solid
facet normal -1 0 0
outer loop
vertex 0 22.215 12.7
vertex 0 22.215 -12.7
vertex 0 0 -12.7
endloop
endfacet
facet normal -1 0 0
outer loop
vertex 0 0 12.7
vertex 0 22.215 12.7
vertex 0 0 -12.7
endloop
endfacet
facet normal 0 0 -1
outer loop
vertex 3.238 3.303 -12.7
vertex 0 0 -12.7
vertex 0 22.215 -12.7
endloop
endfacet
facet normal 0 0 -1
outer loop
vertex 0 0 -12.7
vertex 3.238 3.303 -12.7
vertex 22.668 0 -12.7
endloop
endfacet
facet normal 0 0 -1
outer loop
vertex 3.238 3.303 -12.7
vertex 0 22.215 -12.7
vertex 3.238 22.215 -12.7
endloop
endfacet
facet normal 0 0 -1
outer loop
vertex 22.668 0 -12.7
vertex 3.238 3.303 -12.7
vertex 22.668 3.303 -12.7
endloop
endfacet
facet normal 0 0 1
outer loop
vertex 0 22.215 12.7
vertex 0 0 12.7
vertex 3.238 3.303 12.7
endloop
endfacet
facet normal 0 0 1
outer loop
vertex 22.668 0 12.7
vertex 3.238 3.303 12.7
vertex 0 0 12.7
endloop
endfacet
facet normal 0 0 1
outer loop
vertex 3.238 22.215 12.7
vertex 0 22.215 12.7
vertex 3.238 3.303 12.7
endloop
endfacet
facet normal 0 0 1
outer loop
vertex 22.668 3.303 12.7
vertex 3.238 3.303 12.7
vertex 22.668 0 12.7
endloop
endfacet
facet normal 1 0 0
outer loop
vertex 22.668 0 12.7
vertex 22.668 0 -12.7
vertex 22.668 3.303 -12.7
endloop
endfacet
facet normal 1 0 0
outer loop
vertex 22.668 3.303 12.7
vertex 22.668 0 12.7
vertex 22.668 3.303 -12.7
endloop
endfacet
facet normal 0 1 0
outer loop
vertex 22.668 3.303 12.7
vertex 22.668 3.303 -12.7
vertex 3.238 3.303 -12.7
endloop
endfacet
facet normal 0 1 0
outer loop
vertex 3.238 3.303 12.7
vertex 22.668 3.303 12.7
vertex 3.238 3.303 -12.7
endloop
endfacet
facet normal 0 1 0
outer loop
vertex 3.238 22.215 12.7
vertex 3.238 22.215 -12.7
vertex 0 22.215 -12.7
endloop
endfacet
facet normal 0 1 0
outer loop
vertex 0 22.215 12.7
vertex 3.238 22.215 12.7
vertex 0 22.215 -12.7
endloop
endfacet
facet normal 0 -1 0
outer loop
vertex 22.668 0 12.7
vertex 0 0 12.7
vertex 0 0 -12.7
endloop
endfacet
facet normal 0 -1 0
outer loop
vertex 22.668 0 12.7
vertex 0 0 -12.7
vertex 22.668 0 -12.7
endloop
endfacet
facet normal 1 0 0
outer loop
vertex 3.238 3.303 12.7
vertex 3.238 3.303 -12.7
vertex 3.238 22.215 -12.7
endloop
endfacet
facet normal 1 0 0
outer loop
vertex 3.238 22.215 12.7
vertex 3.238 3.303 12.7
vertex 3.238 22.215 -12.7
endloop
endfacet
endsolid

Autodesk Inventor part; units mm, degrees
sketch "Sketch1" plane through (0, 0, 0) normal (0, 0, 1) x (1, 0, 0)
  line L0 (0, 22.215) -> (0, 0)
  line L1 (0, 0) -> (22.6684, 0)
  line L2 (22.6684, 0) -> (22.6684, 3.3031)
  line L3 (22.6684, 3.3031) -> (3.2383, 3.3031)
  line L4 (3.2383, 3.3031) -> (3.2383, 22.215)
  line L5 (3.2383, 22.215) -> (0, 22.215)
  line L6 (0, 28.8795) -> (0, -2.2215) projected
  line L7 (-2.2668, 0) -> (29.4689, 0) projected
extrude "Extrusion1" add sketch "Sketch1" along normal mid plane 25.4
properties part number "solid_base_feature"
